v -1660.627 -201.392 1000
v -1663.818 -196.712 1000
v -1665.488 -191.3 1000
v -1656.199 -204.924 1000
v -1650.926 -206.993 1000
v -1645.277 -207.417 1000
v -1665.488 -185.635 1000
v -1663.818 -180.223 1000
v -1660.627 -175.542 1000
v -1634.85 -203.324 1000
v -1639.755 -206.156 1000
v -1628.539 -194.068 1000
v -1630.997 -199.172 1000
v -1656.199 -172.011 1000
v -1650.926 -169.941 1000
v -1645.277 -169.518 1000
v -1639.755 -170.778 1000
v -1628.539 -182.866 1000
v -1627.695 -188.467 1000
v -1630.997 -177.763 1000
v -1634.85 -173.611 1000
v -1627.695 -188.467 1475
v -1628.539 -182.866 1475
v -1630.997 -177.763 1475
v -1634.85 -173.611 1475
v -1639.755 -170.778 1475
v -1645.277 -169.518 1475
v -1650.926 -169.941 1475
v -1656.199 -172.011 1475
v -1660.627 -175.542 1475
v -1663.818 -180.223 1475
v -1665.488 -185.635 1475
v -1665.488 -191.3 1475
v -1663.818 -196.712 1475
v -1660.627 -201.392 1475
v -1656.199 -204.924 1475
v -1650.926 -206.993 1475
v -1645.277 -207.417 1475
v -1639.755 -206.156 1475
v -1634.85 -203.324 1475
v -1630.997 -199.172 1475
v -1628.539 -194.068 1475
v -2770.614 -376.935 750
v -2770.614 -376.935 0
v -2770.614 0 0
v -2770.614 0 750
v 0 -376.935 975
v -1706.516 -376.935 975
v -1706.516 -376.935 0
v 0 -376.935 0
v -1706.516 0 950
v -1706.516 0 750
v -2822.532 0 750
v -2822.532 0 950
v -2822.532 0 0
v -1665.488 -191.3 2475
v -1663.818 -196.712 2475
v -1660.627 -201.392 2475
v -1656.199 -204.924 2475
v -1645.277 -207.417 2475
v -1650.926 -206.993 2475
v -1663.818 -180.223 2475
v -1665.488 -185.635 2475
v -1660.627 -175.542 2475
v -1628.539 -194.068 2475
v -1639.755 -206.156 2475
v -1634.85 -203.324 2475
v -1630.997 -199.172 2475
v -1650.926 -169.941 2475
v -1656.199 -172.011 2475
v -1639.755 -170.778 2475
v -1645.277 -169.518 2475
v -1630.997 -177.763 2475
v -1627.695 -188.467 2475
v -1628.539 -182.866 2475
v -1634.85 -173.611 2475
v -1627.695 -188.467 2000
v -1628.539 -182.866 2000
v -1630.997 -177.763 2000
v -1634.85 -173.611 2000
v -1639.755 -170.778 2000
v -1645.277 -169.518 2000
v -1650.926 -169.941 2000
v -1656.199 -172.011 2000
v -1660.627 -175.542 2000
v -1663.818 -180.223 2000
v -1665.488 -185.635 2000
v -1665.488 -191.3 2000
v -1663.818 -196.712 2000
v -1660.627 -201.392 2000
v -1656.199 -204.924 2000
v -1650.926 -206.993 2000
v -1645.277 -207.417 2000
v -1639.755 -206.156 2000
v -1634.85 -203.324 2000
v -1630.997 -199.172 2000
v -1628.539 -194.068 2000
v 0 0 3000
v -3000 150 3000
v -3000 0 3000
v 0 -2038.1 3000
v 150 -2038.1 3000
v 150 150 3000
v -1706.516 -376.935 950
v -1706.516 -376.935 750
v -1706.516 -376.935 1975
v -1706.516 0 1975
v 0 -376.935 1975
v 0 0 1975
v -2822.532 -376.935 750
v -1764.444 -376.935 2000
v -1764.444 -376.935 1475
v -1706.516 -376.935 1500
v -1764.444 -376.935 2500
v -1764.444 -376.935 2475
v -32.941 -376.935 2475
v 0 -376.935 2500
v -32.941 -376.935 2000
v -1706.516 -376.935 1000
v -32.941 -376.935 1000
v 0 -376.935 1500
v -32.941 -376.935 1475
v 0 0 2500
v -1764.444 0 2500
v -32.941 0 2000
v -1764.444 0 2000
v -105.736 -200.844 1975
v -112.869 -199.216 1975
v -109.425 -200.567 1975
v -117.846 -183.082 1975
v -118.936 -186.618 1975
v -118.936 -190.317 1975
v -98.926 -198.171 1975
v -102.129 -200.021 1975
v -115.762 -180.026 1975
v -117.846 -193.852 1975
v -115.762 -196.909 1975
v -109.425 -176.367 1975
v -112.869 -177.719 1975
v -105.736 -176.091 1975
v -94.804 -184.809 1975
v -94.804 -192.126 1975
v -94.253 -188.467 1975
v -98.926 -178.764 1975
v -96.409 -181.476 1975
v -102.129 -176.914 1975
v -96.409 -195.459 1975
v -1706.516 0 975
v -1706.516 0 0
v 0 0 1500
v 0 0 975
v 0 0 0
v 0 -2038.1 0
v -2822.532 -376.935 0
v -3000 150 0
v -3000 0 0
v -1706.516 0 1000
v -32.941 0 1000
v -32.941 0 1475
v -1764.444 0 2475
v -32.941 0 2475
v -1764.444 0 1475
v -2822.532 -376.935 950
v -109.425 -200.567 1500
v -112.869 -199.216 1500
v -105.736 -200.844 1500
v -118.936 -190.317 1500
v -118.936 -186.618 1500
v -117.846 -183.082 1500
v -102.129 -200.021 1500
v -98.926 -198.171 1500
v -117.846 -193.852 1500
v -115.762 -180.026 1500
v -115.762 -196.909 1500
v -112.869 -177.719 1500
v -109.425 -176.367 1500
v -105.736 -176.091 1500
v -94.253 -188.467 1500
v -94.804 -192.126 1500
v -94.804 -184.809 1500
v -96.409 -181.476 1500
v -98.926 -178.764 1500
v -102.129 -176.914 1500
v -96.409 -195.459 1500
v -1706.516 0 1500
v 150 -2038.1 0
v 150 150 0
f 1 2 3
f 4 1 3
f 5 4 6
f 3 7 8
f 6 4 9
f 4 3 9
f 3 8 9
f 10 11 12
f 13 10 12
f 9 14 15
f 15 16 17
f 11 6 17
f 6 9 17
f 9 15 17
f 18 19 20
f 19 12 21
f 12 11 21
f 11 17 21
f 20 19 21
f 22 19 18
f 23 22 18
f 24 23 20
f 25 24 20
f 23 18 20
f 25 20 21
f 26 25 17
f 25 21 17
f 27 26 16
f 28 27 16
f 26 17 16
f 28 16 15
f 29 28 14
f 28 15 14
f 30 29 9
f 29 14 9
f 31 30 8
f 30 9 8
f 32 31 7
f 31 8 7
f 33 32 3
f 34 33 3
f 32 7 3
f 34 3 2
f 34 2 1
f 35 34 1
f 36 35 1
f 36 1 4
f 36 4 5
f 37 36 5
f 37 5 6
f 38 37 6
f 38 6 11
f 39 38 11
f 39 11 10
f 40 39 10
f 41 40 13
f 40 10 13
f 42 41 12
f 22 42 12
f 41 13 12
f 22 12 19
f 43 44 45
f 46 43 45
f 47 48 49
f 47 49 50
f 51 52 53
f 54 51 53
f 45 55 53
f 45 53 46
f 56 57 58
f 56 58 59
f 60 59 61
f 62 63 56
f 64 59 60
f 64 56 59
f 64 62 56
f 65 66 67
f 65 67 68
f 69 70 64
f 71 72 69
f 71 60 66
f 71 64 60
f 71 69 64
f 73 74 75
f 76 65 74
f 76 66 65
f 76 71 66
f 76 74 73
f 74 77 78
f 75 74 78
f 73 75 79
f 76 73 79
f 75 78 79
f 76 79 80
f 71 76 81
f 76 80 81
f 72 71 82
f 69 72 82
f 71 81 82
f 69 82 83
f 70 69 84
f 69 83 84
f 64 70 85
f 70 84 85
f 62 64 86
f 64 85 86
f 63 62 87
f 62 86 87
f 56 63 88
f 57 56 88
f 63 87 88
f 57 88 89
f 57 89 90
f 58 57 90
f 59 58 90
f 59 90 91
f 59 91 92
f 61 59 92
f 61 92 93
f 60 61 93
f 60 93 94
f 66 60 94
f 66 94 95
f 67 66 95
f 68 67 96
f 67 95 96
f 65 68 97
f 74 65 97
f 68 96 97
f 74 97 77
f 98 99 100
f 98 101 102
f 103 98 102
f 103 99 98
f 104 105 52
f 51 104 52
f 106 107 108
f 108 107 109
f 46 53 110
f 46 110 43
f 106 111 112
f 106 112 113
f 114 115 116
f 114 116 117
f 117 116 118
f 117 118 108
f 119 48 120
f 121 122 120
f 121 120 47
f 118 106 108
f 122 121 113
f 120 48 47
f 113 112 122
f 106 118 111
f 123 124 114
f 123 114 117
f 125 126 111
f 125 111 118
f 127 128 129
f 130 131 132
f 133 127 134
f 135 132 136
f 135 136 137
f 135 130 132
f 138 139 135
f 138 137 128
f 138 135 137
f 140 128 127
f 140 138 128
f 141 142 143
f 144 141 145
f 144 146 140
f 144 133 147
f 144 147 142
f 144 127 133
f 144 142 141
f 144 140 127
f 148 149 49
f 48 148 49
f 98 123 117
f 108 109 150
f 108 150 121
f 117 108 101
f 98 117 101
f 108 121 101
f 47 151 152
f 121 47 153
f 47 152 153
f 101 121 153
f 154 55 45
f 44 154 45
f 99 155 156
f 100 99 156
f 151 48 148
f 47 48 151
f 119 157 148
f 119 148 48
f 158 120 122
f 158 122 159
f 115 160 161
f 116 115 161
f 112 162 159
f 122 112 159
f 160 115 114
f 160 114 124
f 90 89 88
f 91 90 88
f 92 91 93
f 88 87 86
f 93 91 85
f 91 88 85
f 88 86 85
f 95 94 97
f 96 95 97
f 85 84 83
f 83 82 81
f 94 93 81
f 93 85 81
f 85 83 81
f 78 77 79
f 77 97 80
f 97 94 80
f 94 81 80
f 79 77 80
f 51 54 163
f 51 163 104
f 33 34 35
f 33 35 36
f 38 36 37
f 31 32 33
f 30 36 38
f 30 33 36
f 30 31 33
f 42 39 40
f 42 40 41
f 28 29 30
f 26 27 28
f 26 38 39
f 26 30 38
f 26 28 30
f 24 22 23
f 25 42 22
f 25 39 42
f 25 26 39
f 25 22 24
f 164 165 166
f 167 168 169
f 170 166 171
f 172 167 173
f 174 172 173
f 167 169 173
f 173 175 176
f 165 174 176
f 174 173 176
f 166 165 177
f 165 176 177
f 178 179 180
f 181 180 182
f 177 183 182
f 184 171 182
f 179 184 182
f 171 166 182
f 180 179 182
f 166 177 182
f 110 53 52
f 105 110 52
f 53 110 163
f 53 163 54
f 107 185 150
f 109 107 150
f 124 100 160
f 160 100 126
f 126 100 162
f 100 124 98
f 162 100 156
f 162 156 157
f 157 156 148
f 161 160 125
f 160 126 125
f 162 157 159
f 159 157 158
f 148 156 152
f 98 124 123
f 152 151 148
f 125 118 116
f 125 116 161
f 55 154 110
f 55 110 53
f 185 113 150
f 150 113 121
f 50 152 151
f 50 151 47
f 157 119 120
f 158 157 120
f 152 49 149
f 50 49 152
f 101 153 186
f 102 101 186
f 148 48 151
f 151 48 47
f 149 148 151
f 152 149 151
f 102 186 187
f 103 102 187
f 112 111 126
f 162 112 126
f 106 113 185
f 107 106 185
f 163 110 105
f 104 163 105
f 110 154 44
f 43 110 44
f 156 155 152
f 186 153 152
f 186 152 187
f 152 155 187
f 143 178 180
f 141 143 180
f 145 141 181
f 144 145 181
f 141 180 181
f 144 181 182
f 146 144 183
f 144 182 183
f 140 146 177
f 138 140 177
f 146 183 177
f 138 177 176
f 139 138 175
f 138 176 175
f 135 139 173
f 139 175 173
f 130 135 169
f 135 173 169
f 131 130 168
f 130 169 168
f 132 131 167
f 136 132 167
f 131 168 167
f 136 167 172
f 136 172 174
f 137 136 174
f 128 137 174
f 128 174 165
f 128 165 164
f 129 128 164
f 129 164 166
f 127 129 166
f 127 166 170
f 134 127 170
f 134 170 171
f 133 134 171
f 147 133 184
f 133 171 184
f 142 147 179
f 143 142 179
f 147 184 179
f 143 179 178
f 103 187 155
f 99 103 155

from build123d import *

# Parameters (mm, degrees)
F1_DEPTH  = 3000
F3_START  = 1975
F2_W      = 1263.8065814972
F2_H      = 376.9347667694
F2_R      = 19.0025065426
F2_W_2    = 409.7685664892
F2_R_2    = 12.4111522874
F2_W_3    = 32.9406410456
F3_DEPTH  = 25
F4_START  = 475
F3_FACE_W = 1706.515789032
F3_FACE_H = 376.9347667694
F4_DEPTH  = 25
F5_START  = 475
F4_FACE_W = 1706.515789032
F4_FACE_H = 376.9347667694
F5_DEPTH  = 25
F6_START  = 1475
F2_W_4    = 57.928442955
F6_DEPTH  = 525
F7_START  = 1000
F7_DEPTH  = 500
F8_START  = 475
F6_FACE_W = 1764.444231987
F6_FACE_H = 376.9347667694
F8_DEPTH  = 25
F9_START  = 2000
F9_DEPTH  = 500
F10_START = 1000
F10_DEPTH = 475
F11_START = 1500
F11_DEPTH = 475
F12_START = 2000
F12_DEPTH = 475
F13_DEPTH = 975
F14_START = 750
F2_W_5    = 1006.1699151993
F2_W_6    = 51.9174337387
F14_DEPTH = 200
F15_DEPTH = 750


with BuildPart() as f1:
    # F0 (on Top) → F1 (new body)
    with BuildSketch(Plane.XY):
        Polygon((-3000, 150), (-3000, 0), (0, 0), (0, -2038.0995258798), (150, -2038.0995258798), (150, 150), align=None)
    extrude(amount=F1_DEPTH)



with BuildPart() as f3:
    # F2 (on Top) → F3 (new body)
    with BuildSketch(Plane.XY.offset(F3_START)):
        with Locations((-1074.6124982834, -188.4673833847)):
            Rectangle(F2_W, F2_H)
        with Locations((-1646.6975212097, -188.4673833847)):
            Circle(F2_R, mode=Mode.SUBTRACT)
        with Locations((-237.8249242902, -188.4673833847)):
            Rectangle(F2_W_2, F2_H)
        with Locations((-106.6637337208, -188.4673833847)):
            Circle(F2_R_2, mode=Mode.SUBTRACT)
        with Locations((-1646.6975212097, -188.4673833847)):
            Circle(F2_R)
        with Locations((-16.4703205228, -188.4673833847)):
            Rectangle(F2_W_3, F2_H)
        with Locations((-106.6637337208, -188.4673833847)):
            Circle(F2_R_2)
    extrude(amount=F3_DEPTH)


with BuildPart() as f4:
    # F3_face (on face) → F4 (new body)
    with BuildSketch(Plane(origin=(-853.257894516, -188.4673833847, 1975), x_dir=(1, 0, 0), z_dir=(0, 0, -1)).offset(F4_START)):
        Rectangle(F3_FACE_W, F3_FACE_H)
    extrude(amount=F4_DEPTH)


with BuildPart() as f5:
    # F4_face (on face) → F5 (new body)
    with BuildSketch(Plane(origin=(-853.257894516, -188.4673833847, 1475), x_dir=(1, 0, 0), z_dir=(0, 0, -1)).offset(F5_START)):
        Rectangle(F4_FACE_W, F4_FACE_H)
    extrude(amount=F5_DEPTH)


with BuildPart() as f1_1:
    add(f1.part)

    add(f3.part)  # F6 merges F3

    add(f4.part)  # F6 merges F4
    # F2 (on Top) → F6 (join)
    with BuildSketch(Plane.XY.offset(F6_START)):
        with Locations((-1735.4800105095, -188.4673833847)):
            Rectangle(F2_W_4, F2_H)
    extrude(amount=F6_DEPTH)


    add(f5.part)  # F7 merges F5
    # F2 (on Top) → F7 (join)
    with BuildSketch(Plane.XY.offset(F7_START)):
        with Locations((-16.4703205228, -188.4673833847)):
            Rectangle(F2_W_3, F2_H)
    extrude(amount=F7_DEPTH)

    # F6_face (on face) → F8 (join)
    with BuildSketch(Plane(origin=(-882.2221159935, -188.4673833847, 2000), x_dir=(1, 0, 0), z_dir=(0, 0, 1)).offset(F8_START)):
        Rectangle(F6_FACE_W, F6_FACE_H)
    extrude(amount=F8_DEPTH)

    # F2 (on Top) → F9 (join)
    with BuildSketch(Plane.XY.offset(F9_START)):
        with Locations((-16.4703205228, -188.4673833847)):
            Rectangle(F2_W_3, F2_H)
    extrude(amount=F9_DEPTH)


with BuildPart() as f10:
    # F2 (on Top) → F10 (new body)
    with BuildSketch(Plane.XY.offset(F10_START)):
        with Locations((-1646.6975212097, -188.4673833847)):
            Circle(F2_R)
    extrude(amount=F10_DEPTH)


with BuildPart() as f11:
    # F2 (on Top) → F11 (new body)
    with BuildSketch(Plane.XY.offset(F11_START)):
        with Locations((-106.6637337208, -188.4673833847)):
            Circle(F2_R_2)
    extrude(amount=F11_DEPTH)


with BuildPart() as f12:
    # F2 (on Top) → F12 (new body)
    with BuildSketch(Plane.XY.offset(F12_START)):
        with Locations((-1646.6975212097, -188.4673833847)):
            Circle(F2_R)
    extrude(amount=F12_DEPTH)


with BuildPart() as f13:
    # F13 (new): a face of the model
    f13_faces = [f1_1.part.faces().sort_by_distance(p)[0] for p in [
        (-853.257894516, -188.4673833847, 975),
    ]]
    extrude(f13_faces, amount=F13_DEPTH)


with BuildPart() as f14:
    # F2 (on Top) → F14 (new body)
    with BuildSketch(Plane.XY.offset(F14_START)):
        with Locations((-2267.5291895866, -188.4673833847)):
            Rectangle(F2_W_5, F2_H)
        with Locations((-2796.5728640556, -188.4673833847)):
            Rectangle(F2_W_6, F2_H)
        with Locations((-1735.4800105095, -188.4673833847)):
            Rectangle(F2_W_4, F2_H)
    extrude(amount=F14_DEPTH)


with BuildPart() as f15:
    # F2 (on Top) → F15 (new body)
    with BuildSketch(Plane.XY):
        with Locations((-2796.5728640556, -188.4673833847)):
            Rectangle(F2_W_6, F2_H)
    extrude(amount=F15_DEPTH)


solid = Compound([f1_1.part, f10.part, f11.part, f12.part, f13.part, f14.part, f15.part])
